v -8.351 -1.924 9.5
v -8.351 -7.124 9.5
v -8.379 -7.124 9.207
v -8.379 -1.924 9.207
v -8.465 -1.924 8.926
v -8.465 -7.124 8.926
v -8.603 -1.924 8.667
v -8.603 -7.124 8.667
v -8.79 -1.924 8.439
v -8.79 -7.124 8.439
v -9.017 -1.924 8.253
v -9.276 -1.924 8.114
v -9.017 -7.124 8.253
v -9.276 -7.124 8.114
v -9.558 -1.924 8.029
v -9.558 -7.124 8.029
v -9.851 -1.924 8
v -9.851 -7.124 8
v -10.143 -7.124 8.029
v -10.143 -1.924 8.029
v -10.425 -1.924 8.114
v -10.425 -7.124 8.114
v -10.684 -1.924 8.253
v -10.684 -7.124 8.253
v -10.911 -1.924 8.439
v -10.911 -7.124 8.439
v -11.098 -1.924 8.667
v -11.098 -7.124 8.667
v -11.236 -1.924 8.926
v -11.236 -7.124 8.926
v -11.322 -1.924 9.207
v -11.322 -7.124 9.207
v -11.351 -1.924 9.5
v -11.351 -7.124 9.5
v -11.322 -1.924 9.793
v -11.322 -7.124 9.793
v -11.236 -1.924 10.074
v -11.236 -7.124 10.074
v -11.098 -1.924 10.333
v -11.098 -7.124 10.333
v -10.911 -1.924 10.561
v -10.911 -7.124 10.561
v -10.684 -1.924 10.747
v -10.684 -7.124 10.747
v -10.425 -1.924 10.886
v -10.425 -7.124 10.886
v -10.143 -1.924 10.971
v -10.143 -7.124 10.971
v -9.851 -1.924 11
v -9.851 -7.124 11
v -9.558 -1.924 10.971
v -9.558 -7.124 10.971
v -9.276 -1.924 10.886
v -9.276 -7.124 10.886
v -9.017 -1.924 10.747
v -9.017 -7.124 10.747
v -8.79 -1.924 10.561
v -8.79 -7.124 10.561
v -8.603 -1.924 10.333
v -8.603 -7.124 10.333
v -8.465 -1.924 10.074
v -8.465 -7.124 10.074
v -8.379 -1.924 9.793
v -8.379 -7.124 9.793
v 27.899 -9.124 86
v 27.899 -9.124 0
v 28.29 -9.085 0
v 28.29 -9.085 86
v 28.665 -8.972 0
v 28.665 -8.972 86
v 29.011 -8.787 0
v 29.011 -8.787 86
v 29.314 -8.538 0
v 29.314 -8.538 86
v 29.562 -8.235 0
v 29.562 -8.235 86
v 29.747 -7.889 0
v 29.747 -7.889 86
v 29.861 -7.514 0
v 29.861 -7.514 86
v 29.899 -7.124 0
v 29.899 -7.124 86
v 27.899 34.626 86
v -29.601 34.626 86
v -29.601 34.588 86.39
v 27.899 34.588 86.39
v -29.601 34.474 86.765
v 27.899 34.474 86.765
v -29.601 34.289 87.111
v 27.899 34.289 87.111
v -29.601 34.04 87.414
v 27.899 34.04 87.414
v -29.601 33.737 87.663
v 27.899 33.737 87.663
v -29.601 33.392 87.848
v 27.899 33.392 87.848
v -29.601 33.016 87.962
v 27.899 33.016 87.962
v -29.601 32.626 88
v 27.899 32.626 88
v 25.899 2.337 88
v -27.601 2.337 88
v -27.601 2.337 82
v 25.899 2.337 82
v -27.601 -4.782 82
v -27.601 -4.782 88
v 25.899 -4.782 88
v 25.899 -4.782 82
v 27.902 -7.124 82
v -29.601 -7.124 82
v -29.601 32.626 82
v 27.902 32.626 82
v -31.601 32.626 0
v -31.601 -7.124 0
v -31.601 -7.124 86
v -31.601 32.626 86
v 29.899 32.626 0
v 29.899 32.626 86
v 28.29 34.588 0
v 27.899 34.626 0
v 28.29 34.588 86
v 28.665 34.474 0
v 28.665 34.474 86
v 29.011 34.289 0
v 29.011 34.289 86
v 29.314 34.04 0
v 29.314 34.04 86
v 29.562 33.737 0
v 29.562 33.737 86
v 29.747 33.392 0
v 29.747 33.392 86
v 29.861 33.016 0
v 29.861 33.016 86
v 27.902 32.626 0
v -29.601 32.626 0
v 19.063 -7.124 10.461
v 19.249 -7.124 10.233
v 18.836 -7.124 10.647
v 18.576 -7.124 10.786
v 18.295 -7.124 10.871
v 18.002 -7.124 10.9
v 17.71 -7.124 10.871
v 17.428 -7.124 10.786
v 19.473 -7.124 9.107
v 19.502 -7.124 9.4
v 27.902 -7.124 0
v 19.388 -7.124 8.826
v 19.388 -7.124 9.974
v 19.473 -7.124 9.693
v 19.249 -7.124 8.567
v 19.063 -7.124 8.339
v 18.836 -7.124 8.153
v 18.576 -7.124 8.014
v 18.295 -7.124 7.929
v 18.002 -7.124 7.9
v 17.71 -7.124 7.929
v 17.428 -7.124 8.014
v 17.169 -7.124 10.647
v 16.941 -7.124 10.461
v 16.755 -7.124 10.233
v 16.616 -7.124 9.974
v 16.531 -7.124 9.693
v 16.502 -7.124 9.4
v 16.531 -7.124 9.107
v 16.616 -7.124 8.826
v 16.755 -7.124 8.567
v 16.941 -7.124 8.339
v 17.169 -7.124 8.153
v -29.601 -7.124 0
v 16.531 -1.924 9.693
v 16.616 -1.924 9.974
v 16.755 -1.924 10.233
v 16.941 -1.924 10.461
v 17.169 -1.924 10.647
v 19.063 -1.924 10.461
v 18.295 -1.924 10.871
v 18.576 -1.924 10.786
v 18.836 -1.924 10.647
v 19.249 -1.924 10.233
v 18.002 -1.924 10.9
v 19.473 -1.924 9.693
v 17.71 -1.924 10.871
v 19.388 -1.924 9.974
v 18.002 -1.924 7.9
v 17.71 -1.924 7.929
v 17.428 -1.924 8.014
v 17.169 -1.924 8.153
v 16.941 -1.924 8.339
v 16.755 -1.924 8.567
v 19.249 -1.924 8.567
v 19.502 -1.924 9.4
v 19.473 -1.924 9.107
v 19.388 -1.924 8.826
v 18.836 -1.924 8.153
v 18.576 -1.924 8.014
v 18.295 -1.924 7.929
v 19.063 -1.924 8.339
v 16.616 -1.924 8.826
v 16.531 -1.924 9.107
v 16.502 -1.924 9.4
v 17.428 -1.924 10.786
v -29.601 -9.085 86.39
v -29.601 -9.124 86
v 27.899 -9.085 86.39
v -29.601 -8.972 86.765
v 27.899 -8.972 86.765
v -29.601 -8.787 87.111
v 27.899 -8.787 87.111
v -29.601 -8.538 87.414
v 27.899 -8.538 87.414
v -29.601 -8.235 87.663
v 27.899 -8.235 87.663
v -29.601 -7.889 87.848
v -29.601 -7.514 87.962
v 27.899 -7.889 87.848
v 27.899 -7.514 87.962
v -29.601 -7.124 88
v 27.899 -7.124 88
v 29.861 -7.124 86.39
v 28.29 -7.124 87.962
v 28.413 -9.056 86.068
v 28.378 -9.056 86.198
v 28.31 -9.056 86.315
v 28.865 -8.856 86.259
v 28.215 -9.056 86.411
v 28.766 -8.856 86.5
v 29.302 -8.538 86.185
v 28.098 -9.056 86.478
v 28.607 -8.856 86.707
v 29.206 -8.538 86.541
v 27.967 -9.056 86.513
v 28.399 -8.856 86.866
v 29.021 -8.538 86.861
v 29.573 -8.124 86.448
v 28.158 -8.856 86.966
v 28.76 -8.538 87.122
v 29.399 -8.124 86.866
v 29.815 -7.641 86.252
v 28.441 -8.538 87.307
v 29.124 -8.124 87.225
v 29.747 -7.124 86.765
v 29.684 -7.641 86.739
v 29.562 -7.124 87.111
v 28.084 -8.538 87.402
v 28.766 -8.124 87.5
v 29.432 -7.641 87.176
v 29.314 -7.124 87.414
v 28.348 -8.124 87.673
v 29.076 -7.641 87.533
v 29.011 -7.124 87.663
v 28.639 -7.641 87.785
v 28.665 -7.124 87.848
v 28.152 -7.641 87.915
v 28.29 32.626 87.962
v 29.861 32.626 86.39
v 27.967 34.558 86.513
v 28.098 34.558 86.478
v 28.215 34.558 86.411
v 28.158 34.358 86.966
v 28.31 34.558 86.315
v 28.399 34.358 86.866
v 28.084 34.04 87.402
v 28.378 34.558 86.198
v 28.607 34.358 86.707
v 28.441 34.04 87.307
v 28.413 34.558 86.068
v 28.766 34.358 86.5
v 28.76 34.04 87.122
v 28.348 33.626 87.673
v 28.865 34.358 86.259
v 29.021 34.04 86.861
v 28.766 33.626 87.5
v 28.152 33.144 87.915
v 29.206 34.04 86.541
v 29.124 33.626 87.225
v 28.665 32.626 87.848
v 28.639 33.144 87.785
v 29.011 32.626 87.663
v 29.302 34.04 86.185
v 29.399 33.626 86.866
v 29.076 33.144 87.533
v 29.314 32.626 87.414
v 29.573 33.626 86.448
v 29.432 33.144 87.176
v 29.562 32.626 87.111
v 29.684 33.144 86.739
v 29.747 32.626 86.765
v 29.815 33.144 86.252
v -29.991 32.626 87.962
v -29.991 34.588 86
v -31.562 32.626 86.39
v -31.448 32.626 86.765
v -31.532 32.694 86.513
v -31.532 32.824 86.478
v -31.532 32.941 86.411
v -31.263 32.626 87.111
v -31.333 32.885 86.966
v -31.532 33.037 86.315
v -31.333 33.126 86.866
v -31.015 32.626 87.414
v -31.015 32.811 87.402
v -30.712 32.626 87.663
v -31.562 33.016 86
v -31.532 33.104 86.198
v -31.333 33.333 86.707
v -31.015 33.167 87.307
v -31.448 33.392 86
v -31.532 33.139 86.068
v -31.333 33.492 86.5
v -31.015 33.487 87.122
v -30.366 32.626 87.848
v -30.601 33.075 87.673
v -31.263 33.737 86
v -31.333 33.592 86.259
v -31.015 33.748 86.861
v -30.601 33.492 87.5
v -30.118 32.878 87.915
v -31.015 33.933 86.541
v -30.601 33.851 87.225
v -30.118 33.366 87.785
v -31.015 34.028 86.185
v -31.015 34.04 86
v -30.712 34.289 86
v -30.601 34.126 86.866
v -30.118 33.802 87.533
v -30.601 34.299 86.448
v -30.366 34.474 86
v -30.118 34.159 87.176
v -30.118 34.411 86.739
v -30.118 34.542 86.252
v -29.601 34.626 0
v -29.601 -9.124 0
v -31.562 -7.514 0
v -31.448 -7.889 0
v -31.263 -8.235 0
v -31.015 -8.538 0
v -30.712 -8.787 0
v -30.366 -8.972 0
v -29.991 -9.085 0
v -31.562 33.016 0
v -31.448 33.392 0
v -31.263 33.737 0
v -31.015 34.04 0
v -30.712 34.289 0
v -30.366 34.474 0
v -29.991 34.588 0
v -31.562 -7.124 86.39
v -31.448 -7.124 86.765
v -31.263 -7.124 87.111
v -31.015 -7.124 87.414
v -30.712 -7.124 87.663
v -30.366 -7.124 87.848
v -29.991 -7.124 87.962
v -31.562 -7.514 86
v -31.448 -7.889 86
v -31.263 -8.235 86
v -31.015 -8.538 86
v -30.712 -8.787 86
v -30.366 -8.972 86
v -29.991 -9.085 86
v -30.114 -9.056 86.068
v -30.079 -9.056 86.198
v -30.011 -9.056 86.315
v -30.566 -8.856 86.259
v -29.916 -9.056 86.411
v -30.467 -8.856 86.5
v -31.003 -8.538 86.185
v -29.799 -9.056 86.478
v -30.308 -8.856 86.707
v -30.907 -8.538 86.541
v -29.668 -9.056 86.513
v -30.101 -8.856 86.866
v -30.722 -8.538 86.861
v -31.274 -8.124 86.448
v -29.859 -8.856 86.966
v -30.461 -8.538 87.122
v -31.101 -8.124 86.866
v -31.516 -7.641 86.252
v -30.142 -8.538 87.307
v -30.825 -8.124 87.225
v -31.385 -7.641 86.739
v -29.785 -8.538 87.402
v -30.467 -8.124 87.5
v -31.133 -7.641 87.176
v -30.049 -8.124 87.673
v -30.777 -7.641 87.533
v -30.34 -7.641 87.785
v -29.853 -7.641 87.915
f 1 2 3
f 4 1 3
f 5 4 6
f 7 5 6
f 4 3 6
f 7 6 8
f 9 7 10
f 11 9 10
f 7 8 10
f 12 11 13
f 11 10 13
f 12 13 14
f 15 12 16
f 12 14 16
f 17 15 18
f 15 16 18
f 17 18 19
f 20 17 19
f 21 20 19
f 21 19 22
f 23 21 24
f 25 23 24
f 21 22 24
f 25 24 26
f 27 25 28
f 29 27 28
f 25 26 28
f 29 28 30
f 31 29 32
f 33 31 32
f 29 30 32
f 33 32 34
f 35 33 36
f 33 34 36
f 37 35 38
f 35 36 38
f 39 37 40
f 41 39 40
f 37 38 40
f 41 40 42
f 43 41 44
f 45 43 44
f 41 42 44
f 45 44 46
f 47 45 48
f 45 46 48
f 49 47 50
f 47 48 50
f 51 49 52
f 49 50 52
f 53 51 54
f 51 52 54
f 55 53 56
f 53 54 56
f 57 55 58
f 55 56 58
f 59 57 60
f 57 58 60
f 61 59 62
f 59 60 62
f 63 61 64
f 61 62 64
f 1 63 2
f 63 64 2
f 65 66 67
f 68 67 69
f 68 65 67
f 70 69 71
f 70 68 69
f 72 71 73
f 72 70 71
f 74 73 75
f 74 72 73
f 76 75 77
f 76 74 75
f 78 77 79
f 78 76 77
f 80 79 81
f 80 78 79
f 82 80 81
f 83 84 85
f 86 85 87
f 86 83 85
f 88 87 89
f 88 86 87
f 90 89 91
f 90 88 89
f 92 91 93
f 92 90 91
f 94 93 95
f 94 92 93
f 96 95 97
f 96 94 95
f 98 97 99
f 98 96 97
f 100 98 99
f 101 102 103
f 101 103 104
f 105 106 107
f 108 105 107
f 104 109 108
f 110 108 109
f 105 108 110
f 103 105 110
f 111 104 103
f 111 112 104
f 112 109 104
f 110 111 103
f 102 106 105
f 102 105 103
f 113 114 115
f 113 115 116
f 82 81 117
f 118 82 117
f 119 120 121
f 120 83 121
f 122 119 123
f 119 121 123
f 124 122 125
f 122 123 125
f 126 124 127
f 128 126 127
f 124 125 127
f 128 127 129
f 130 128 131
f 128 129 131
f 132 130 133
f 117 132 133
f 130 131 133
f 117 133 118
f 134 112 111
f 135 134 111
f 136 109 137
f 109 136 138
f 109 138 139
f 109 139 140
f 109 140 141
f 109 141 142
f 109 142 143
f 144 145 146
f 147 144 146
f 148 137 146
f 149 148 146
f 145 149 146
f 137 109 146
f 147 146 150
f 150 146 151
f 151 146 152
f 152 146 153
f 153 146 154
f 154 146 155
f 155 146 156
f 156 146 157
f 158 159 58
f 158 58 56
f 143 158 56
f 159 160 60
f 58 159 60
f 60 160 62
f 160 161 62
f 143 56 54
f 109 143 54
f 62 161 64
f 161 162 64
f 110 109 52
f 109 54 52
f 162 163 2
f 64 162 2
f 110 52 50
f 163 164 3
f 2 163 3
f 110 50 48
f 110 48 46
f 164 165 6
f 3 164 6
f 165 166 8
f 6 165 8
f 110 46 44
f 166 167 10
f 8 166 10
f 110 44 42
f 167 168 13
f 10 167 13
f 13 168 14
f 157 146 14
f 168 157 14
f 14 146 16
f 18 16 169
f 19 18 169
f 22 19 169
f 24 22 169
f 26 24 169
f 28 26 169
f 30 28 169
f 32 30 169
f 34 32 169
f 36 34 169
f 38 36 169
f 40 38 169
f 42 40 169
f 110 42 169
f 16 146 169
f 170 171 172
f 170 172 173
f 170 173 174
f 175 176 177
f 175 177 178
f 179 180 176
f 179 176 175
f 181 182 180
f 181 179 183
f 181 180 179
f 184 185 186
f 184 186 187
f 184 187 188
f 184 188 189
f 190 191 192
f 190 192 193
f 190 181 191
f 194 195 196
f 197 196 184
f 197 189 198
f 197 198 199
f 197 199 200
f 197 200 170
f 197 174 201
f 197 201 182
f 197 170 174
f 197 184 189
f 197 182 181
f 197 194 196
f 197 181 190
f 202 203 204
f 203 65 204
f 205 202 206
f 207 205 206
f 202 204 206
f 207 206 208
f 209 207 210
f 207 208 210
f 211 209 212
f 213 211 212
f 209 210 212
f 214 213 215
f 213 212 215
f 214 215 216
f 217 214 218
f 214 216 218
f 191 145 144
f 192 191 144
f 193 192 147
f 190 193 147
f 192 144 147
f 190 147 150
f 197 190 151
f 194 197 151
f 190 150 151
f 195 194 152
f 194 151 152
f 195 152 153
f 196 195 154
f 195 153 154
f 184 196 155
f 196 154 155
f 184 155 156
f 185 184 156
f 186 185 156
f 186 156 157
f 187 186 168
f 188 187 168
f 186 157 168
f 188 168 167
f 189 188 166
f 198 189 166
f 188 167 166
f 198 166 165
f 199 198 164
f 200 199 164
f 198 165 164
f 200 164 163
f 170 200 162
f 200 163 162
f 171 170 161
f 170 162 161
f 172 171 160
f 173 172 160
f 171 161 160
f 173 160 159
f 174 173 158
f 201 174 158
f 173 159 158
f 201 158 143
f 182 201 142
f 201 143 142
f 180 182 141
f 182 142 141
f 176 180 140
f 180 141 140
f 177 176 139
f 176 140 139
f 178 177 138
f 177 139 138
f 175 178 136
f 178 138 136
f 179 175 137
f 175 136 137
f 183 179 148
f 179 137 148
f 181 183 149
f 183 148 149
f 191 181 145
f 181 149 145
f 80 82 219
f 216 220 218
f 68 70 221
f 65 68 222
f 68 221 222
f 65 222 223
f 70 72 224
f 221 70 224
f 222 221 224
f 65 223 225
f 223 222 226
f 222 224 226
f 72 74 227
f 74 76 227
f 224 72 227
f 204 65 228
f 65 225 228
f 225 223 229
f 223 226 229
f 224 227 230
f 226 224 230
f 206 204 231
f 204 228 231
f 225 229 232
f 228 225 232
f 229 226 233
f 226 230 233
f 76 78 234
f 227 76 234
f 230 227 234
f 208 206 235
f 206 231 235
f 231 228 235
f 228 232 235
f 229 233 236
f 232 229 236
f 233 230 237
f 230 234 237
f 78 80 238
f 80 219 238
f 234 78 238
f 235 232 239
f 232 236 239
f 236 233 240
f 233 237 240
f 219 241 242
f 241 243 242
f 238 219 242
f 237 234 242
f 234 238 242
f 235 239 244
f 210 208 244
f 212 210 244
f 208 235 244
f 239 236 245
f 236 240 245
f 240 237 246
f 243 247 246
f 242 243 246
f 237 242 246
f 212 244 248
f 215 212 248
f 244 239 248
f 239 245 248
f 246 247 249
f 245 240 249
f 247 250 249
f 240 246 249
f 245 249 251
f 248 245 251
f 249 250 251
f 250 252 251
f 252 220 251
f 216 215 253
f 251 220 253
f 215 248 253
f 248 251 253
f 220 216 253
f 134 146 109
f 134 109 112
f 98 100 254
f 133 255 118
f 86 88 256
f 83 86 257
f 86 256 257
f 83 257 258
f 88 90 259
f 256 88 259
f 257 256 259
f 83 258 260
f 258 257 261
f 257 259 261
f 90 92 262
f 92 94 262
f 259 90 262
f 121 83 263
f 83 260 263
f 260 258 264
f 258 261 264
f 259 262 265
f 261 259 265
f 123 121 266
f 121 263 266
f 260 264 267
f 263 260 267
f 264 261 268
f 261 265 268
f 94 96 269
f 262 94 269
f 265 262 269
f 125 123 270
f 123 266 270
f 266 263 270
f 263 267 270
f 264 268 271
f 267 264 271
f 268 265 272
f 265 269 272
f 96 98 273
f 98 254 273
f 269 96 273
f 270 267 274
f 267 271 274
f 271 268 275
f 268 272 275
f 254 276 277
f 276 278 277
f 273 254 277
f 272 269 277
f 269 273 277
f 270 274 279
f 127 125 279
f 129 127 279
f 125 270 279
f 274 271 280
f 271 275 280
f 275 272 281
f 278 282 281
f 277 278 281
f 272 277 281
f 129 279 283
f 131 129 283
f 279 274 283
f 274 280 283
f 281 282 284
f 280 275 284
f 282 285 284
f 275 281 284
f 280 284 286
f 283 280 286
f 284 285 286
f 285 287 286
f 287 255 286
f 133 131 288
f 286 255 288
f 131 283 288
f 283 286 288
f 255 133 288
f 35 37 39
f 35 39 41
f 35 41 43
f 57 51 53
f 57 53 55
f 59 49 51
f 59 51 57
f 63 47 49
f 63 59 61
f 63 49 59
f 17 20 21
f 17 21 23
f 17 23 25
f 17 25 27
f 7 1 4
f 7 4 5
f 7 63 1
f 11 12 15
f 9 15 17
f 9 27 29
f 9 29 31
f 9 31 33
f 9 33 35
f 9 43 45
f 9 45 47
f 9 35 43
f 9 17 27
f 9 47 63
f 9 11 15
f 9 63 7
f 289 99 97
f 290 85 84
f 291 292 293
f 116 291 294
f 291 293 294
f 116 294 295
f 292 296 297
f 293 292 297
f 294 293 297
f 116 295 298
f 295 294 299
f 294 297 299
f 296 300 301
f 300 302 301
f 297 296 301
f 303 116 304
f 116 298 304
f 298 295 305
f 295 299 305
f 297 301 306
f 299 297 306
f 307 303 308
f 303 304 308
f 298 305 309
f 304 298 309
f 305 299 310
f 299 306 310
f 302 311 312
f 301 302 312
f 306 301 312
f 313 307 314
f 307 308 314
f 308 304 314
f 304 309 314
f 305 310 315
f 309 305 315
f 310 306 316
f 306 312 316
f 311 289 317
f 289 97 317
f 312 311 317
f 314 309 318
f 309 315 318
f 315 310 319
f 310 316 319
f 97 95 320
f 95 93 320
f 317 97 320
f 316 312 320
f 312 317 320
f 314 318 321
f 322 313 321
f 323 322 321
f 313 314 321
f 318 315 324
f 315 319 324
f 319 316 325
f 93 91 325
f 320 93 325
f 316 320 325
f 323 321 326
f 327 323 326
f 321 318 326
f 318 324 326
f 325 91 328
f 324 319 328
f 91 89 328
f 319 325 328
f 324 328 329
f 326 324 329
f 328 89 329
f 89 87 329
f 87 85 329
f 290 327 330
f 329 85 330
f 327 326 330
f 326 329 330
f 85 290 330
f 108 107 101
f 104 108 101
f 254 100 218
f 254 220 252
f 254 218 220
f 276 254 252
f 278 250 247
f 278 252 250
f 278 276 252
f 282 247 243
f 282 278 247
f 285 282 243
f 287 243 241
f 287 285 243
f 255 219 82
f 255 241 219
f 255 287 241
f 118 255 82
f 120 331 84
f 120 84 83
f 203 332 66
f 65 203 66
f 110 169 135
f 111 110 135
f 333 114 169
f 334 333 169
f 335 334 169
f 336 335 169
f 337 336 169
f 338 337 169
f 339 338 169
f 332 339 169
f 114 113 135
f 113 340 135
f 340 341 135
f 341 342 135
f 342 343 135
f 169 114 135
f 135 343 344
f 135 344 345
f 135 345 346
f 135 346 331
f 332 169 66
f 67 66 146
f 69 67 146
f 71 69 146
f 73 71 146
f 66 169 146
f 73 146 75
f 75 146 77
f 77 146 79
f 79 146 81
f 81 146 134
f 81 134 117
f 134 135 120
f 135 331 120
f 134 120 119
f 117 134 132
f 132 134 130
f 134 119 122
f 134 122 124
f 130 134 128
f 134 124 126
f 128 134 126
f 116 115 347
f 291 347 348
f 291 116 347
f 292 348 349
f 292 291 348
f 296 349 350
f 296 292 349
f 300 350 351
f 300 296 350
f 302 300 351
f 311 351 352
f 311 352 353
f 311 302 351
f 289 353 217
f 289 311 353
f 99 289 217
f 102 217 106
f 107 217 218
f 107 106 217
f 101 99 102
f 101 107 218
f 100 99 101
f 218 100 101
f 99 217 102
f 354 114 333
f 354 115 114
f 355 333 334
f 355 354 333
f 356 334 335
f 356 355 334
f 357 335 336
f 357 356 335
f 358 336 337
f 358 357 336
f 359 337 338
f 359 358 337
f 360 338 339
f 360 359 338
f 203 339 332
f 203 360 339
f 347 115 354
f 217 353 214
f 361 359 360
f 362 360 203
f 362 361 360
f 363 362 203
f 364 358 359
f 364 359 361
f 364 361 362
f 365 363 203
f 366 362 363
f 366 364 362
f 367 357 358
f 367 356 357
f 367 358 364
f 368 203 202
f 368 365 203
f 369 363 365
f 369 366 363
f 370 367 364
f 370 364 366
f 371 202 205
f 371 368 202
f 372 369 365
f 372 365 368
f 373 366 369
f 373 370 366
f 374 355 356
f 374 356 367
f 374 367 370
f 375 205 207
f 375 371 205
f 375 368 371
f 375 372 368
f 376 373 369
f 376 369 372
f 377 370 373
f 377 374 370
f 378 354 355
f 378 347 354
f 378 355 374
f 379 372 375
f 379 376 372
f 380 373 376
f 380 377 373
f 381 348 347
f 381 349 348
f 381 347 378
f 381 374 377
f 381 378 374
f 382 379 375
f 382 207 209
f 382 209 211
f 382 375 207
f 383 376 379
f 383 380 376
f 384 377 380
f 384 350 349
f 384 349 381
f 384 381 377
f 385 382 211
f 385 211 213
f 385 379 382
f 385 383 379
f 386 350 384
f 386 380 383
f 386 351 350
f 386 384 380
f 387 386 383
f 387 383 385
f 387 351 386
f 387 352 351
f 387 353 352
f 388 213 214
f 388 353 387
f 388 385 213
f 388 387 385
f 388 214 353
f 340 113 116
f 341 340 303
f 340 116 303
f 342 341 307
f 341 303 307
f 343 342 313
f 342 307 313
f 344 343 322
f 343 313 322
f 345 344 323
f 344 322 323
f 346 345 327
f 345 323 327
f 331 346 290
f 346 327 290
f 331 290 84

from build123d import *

# Parameters (mm, degrees)
ESQUISSE1_W             = 61.5
ESQUISSE1_H             = 43.75
BOSS_EXTRU_1_DEPTH      = 88
ENL_V_MAT_EXTRU_4_REACH = 90
ESQUISSE3_W             = 53.5
ESQUISSE3_H             = 7.118224843
ESQUISSE6_W             = 57.502648101
ESQUISSE6_H             = 39.75
ENL_V_MAT_EXTRU_5_DEPTH = 82
CONG_4_R                = 2
ESQUISSE7_R             = 1.5
BOSS_EXTRU_2_DEPTH      = 5.2
ESQUISSE8_R             = 1.5
BOSS_EXTRU_3_DEPTH      = 5.2


with BuildPart() as part:
    # Esquisse1 → Boss.-Extru.1 (new body)
    with BuildSketch(Plane.XY):
        with Locations((-0.850502513, 12.751256281)):
            Rectangle(ESQUISSE1_W, ESQUISSE1_H)
    extrude(amount=BOSS_EXTRU_1_DEPTH)

    # Esquisse3 → Enlèv. mat.-Extru.4 (cut, up to next)
    with BuildSketch(Plane.XY.offset(88), mode=Mode.PRIVATE) as enl_v_mat_extru_4_sk1:
        with Locations((-0.850502513, -1.222513082)):
            Rectangle(ESQUISSE3_W, ESQUISSE3_H)
    enl_v_mat_extru_4_tool1 = extrude(enl_v_mat_extru_4_sk1.sketch, amount=-ENL_V_MAT_EXTRU_4_REACH, mode=Mode.PRIVATE) & part.part
    add(enl_v_mat_extru_4_tool1.solids().sort_by_distance((-0.850503, -1.222513, 88))[0], mode=Mode.SUBTRACT)

    # Esquisse6 → Enlèv. mat.-Extru.5 (cut)
    with BuildSketch(Plane(origin=(0, 0, 0), x_dir=(-1, 0, 0), z_dir=(0, 0, -1))):
        with Locations((0.849178462, 12.751256281)):
            Rectangle(ESQUISSE6_W, ESQUISSE6_H)
    extrude(amount=-ENL_V_MAT_EXTRU_5_DEPTH, mode=Mode.SUBTRACT)

    # Congé4
    cong_4_edges = [part.edges().sort_by_distance(p)[0] for p in [
        (29.899497487, 12.751256281, 88),
        (-0.850502513, 34.626256281, 88),
        (-31.600502513, 12.751256281, 88),
        (-31.600502513, 34.626256281, 44),
        (29.899497487, 34.626256281, 44),
        (29.899497487, -9.123743719, 44),
        (-31.600502513, -9.123743719, 44),
        (-0.850502513, -9.123743719, 88),
    ]]
    fillet(cong_4_edges, radius=CONG_4_R)

    # Esquisse7 → Boss.-Extru.2 (add)
    with BuildSketch(Plane(origin=(0, -7.123743719, 0), x_dir=(1, 0, 0), z_dir=(0, 1, 0))):
        with Locations((18.002145588, -9.4)):
            Circle(ESQUISSE7_R)
    extrude(amount=BOSS_EXTRU_2_DEPTH)

    # Esquisse8 → Boss.-Extru.3 (add)
    with BuildSketch(Plane(origin=(0, -7.123743719, 0), x_dir=(1, 0, 0), z_dir=(0, 1, 0))):
        with Locations((-9.850502513, -9.5)):
            Circle(ESQUISSE8_R)
    extrude(amount=BOSS_EXTRU_3_DEPTH)


solid = part.part
